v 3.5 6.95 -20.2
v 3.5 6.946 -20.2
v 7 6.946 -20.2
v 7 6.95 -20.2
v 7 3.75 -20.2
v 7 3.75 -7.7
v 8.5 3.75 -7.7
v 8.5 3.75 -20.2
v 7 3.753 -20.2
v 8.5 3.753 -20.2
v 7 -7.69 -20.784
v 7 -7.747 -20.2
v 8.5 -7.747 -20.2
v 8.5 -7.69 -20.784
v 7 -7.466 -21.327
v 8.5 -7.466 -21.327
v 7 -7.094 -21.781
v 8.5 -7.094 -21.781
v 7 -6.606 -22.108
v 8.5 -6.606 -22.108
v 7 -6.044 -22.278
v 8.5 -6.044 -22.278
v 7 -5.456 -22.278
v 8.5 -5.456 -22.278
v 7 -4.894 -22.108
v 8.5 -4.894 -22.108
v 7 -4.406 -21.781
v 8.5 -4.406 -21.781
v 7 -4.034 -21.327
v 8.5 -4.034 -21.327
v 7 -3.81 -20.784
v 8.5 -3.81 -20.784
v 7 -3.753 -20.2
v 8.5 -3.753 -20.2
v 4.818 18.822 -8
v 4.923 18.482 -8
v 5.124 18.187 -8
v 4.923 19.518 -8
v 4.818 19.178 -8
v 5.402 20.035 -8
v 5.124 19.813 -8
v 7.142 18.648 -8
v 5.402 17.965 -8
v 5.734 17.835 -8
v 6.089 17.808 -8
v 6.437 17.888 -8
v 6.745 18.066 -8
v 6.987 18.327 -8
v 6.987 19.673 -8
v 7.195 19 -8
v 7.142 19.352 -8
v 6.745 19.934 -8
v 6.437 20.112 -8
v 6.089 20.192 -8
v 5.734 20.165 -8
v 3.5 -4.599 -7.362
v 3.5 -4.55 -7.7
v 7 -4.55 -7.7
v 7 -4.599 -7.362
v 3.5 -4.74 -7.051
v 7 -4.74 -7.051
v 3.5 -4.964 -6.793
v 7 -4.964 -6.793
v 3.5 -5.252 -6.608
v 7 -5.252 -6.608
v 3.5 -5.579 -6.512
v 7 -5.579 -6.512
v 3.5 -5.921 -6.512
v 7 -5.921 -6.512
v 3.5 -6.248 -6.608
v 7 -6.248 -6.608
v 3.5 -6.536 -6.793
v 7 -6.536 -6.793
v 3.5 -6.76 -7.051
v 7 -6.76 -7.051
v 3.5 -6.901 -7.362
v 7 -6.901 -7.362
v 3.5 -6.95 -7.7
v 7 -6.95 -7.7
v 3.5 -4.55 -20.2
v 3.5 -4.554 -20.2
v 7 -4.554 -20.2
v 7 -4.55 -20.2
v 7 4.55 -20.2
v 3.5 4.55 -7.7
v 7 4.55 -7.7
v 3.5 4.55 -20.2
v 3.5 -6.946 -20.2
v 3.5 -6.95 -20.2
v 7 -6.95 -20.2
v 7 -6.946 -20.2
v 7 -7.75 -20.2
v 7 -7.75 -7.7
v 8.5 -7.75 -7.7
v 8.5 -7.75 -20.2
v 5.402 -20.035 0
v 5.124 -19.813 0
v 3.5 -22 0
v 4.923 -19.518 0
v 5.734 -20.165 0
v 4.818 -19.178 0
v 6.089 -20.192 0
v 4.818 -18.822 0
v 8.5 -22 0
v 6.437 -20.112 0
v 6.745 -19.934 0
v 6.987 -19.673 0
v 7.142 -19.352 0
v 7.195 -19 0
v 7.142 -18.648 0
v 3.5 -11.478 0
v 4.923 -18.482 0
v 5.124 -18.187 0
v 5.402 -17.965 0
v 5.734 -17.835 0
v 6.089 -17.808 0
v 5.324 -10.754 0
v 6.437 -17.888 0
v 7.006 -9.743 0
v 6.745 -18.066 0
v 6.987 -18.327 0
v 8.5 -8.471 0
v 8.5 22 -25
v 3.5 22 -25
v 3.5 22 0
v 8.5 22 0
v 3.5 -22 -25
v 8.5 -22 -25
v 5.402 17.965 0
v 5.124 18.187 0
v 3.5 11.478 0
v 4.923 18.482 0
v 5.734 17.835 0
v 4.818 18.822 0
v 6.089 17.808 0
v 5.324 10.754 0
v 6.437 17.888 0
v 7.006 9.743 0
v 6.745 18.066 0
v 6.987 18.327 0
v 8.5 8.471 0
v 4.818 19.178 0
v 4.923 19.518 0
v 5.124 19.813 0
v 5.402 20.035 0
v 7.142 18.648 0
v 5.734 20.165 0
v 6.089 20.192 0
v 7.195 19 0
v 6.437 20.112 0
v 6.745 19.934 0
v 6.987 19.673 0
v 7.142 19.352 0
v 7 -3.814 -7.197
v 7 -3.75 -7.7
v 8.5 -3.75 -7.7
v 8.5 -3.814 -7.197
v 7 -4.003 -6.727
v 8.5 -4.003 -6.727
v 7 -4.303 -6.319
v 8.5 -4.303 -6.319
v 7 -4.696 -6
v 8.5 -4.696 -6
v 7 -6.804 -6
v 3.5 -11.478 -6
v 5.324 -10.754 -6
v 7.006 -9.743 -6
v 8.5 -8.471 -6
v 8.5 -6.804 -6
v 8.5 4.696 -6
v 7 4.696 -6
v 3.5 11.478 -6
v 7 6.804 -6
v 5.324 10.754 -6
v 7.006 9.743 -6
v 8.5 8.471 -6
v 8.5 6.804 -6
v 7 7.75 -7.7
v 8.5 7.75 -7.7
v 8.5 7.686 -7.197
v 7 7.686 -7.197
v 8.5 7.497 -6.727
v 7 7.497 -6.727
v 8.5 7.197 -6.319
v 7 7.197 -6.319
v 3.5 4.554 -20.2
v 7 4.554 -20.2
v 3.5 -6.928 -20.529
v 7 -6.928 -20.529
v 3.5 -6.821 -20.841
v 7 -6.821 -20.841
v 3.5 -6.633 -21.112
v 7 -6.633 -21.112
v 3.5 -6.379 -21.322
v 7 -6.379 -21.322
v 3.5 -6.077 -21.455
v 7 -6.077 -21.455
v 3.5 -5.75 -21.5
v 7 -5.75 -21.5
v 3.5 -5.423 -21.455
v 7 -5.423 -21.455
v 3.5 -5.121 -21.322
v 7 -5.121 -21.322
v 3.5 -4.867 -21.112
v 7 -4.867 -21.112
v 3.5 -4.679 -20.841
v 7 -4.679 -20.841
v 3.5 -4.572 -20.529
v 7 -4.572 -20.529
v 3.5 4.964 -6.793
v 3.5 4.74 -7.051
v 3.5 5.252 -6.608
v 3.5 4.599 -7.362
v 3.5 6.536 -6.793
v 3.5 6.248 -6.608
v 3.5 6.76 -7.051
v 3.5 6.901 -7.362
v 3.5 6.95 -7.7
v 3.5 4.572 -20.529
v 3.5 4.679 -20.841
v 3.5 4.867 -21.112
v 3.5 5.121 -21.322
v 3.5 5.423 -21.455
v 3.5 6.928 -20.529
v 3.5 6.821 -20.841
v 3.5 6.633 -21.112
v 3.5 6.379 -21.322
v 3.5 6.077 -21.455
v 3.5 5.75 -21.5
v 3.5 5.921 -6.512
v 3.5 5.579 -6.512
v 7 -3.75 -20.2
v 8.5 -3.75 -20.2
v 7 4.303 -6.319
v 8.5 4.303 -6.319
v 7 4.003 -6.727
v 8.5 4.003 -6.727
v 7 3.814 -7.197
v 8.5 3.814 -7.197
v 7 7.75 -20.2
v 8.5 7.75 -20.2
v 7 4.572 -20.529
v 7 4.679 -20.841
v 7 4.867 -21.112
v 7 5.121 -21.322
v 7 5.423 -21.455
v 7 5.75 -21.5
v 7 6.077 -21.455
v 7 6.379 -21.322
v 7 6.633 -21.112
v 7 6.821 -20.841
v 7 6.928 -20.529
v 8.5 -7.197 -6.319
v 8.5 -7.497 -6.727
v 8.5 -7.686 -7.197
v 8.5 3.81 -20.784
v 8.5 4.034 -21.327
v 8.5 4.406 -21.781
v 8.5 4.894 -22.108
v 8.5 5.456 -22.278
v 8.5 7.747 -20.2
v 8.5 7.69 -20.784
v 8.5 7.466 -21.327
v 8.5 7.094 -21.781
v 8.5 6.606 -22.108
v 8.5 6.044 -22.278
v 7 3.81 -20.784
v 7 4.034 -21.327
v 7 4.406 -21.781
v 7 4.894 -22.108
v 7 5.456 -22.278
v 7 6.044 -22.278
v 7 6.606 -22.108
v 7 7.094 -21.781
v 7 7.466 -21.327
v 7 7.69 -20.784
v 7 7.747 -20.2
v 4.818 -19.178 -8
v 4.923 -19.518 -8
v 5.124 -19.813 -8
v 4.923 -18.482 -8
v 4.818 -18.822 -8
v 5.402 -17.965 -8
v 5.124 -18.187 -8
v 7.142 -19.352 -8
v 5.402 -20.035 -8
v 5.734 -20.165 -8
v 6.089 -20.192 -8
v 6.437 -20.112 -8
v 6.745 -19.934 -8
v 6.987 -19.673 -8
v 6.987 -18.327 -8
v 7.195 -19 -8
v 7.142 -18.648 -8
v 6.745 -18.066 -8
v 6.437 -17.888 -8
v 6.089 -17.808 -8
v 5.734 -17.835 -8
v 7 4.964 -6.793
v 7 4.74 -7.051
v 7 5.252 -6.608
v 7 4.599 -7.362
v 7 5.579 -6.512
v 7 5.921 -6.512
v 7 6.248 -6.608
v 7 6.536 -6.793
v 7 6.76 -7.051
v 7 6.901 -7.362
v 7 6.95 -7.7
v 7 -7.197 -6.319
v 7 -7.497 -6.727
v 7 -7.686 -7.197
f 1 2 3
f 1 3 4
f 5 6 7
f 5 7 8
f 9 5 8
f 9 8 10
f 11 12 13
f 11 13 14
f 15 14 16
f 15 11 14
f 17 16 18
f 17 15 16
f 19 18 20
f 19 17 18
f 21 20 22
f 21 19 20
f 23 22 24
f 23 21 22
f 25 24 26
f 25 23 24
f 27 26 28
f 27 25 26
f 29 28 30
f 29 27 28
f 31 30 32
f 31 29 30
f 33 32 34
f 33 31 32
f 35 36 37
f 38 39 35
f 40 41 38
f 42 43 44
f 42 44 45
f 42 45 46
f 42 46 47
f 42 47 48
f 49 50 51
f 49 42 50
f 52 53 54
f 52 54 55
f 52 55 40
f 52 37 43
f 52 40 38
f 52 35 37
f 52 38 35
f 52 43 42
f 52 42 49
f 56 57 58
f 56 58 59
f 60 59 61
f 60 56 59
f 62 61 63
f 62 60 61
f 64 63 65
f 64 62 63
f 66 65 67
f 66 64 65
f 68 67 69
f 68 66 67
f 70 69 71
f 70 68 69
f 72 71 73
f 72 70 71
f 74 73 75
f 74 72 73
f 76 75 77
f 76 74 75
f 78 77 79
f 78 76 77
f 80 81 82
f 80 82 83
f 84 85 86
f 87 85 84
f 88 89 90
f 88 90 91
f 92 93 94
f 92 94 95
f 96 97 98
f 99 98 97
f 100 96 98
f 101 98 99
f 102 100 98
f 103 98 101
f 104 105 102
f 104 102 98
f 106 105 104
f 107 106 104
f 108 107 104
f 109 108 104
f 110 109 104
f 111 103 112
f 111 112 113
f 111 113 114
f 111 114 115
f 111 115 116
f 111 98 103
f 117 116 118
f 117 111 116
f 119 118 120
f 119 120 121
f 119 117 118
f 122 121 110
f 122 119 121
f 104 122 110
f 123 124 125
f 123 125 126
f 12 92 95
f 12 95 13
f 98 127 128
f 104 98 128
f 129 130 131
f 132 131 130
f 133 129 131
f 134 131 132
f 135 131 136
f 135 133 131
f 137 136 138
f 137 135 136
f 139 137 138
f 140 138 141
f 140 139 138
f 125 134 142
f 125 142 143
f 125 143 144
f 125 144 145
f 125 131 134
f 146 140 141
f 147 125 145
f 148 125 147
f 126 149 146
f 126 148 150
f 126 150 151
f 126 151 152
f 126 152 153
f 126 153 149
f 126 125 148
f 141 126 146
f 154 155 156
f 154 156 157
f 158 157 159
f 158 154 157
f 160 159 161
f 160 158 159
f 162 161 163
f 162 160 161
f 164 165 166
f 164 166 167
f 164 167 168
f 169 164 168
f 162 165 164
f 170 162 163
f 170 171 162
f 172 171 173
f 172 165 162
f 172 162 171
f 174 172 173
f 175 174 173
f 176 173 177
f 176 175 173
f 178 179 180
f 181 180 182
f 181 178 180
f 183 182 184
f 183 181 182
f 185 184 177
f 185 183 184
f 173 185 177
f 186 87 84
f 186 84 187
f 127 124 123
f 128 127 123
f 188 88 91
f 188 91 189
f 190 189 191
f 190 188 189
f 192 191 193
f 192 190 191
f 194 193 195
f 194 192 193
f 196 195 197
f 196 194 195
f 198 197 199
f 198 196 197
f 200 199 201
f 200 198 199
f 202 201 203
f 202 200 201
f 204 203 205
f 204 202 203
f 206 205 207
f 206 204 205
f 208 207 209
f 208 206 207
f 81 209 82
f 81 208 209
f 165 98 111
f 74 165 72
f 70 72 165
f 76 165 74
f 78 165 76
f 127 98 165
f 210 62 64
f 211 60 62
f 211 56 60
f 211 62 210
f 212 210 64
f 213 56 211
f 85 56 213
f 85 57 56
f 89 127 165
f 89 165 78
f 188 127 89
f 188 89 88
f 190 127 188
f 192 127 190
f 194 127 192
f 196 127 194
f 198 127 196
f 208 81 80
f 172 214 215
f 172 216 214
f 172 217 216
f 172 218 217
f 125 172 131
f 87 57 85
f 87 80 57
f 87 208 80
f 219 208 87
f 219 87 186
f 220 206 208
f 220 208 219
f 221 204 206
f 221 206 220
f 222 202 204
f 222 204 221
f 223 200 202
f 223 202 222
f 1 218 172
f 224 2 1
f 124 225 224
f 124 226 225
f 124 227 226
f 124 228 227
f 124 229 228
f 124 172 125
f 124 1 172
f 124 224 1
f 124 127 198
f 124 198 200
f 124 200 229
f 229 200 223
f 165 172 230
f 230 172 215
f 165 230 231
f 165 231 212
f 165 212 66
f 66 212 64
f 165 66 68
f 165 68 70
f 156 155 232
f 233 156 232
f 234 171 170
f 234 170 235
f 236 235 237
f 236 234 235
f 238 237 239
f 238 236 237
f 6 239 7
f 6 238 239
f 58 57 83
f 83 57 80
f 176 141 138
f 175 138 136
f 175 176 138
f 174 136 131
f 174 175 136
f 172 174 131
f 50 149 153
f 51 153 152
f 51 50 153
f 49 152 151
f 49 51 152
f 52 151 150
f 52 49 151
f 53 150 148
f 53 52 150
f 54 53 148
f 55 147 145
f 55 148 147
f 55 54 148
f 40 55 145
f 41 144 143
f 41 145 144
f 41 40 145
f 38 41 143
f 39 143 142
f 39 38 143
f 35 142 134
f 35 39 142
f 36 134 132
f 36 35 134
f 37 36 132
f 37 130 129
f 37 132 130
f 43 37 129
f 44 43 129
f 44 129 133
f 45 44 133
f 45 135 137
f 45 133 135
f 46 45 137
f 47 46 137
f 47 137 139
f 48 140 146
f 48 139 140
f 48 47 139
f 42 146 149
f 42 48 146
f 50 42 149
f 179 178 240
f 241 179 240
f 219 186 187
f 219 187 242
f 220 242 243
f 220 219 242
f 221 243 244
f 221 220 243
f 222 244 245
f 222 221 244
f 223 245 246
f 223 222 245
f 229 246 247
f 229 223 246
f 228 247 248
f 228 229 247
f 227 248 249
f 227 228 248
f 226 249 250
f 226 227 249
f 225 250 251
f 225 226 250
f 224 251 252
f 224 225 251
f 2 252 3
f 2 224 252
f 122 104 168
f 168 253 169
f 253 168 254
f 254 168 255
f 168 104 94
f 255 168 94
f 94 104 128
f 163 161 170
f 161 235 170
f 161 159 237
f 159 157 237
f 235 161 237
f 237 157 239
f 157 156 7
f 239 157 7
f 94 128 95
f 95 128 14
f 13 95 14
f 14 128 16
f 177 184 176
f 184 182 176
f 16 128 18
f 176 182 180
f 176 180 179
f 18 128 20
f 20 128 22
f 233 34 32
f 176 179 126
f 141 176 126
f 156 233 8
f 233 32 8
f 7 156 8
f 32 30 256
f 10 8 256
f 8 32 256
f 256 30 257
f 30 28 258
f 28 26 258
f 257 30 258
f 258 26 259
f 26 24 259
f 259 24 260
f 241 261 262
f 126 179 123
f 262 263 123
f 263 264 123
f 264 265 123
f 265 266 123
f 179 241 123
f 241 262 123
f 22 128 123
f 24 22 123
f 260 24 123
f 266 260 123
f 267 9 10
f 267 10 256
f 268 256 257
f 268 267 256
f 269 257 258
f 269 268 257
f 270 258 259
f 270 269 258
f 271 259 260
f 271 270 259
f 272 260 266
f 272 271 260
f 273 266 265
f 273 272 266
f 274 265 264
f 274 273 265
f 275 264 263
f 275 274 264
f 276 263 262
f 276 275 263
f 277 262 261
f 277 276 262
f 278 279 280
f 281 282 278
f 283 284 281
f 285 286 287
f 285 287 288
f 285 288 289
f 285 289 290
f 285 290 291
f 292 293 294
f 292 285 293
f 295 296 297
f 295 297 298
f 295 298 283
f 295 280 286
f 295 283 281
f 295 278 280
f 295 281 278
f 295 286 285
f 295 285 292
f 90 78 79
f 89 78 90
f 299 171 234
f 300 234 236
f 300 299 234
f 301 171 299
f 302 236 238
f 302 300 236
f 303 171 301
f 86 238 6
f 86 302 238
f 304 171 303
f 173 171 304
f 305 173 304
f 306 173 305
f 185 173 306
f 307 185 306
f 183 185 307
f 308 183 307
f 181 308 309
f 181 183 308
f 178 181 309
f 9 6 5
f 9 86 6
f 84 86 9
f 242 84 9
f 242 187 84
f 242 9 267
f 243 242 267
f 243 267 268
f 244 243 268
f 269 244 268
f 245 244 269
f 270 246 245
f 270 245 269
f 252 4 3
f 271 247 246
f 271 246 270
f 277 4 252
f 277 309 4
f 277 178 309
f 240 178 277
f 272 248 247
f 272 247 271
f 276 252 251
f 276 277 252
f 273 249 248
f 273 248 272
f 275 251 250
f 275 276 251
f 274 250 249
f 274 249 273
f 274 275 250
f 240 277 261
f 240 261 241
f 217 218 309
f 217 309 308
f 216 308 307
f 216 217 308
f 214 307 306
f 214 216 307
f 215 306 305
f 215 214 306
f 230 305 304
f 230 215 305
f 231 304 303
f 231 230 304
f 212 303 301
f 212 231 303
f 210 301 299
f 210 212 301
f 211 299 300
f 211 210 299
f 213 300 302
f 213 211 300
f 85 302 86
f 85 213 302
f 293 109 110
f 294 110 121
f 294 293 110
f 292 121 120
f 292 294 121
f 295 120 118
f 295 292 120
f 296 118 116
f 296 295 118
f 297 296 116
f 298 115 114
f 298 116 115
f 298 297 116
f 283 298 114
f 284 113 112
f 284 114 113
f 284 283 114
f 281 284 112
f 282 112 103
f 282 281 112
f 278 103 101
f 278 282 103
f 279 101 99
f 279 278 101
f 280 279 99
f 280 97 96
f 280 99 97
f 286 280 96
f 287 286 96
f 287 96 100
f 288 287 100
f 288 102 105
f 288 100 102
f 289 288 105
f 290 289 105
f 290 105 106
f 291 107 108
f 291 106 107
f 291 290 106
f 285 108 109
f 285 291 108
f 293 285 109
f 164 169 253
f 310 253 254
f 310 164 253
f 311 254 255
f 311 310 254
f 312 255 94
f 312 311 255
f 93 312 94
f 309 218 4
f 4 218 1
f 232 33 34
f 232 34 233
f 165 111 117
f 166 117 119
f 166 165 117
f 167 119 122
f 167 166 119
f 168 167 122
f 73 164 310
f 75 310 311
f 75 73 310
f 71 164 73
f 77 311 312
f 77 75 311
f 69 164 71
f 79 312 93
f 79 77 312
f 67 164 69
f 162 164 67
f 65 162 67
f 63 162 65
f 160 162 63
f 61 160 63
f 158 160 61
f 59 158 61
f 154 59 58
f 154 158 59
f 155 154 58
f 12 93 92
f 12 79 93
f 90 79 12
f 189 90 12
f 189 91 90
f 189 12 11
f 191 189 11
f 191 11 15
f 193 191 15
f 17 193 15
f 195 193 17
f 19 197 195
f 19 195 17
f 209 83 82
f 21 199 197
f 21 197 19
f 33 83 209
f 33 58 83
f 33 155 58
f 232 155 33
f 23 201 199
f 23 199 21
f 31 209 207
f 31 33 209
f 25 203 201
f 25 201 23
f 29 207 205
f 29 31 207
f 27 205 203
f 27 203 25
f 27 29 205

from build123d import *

# Parameters (mm, degrees)
CYLINDER014_R             = 2
CYLINDER014_DEPTH         = 1.6
CYLINDER015_R             = 2
CYLINDER015_DEPTH         = 1.6
BOX003_W                  = 12.5
BOX003_H                  = 4
BOX003_DEPTH              = 1.6
FUSION006_PLACEMENT_ANGLE = 90
CYLINDER016_R             = 2
CYLINDER016_DEPTH         = 1.6
CYLINDER017_R             = 2
CYLINDER017_DEPTH         = 1.6
BOX004_W                  = 12.5
BOX004_H                  = 4
BOX004_DEPTH              = 1.6
FUSION007_PLACEMENT_ANGLE = 90
CYLINDER007_R             = 1.195
CYLINDER007_DEPTH         = 10
CYLINDER006_R             = 1.195
CYLINDER006_DEPTH         = 10
CYLINDER005_R             = 12
CYLINDER005_DEPTH         = 17
CYLINDER001_R             = 1.2
CYLINDER001_DEPTH         = 10
CYLINDER002_R             = 1.2
CYLINDER002_DEPTH         = 10
BOX001_W                  = 12.5
BOX001_H                  = 2.4
BOX001_DEPTH              = 10
FUSION_PLACEMENT_ANGLE    = 90
CYLINDER003_R             = 1.2
CYLINDER003_DEPTH         = 10
CYLINDER004_R             = 1.2
CYLINDER004_DEPTH         = 10
BOX002_W                  = 12.5
BOX002_H                  = 2.4
BOX002_DEPTH              = 10
FUSION001_PLACEMENT_ANGLE = 90
BOX_W                     = 5
BOX_H                     = 44
BOX_DEPTH                 = 25


with BuildPart() as cylinder014:
    # Cylinder014 → Cylinder014 (new body)
    with BuildSketch(Plane.XY):
        Circle(CYLINDER014_R)
    extrude(amount=CYLINDER014_DEPTH)


with BuildPart() as cylinder015:
    # Cylinder015 → Cylinder015 (new body)
    with BuildSketch(Plane(origin=(12.6, 0, 0), x_dir=(1, 0, 0), z_dir=(0, 0, 1))):
        Circle(CYLINDER015_R)
    extrude(amount=CYLINDER015_DEPTH)


with BuildPart() as langloch002:
    # Box003 → Box003 (new body)
    with BuildSketch(Plane(origin=(0, -2, 0), x_dir=(1, 0, 0), z_dir=(0, 0, 1))):
        with Locations((6.25, 2)):
            Rectangle(BOX003_W, BOX003_H)
    extrude(amount=BOX003_DEPTH)

    # Fusion006: union Cylinder014, Cylinder015
    add(cylinder014.part)
    add(cylinder015.part)


with BuildPart() as langloch002_1:
    # Fusion006 placement: moved
    add(langloch002.part.moved(Location((7, -5.75, -7.7))).rotate(Axis((7, -5.75, -7.7), (0, 1, 0)), FUSION006_PLACEMENT_ANGLE))


with BuildPart() as cylinder016:
    # Cylinder016 → Cylinder016 (new body)
    with BuildSketch(Plane.XY):
        Circle(CYLINDER016_R)
    extrude(amount=CYLINDER016_DEPTH)


with BuildPart() as cylinder017:
    # Cylinder017 → Cylinder017 (new body)
    with BuildSketch(Plane(origin=(12.6, 0, 0), x_dir=(1, 0, 0), z_dir=(0, 0, 1))):
        Circle(CYLINDER017_R)
    extrude(amount=CYLINDER017_DEPTH)


with BuildPart() as fusion008:
    # Box004 → Box004 (new body)
    with BuildSketch(Plane(origin=(0, -2, 0), x_dir=(1, 0, 0), z_dir=(0, 0, 1))):
        with Locations((6.25, 2)):
            Rectangle(BOX004_W, BOX004_H)
    extrude(amount=BOX004_DEPTH)

    # Fusion007: union Cylinder016, Cylinder017
    add(cylinder016.part)
    add(cylinder017.part)


with BuildPart() as fusion008_1:
    # Fusion007 placement: moved
    add(fusion008.part.moved(Location((7, 5.75, -7.7))).rotate(Axis((7, 5.75, -7.7), (0, 1, 0)), FUSION007_PLACEMENT_ANGLE))

    # Fusion008: union Langloch002
    add(langloch002_1.part)


with BuildPart() as cylinder007:
    # Cylinder007 → Cylinder007 (new body)
    with BuildSketch(Plane(origin=(6, -19, -8), x_dir=(1, 0, 0), z_dir=(0, 0, 1))):
        Circle(CYLINDER007_R)
    extrude(amount=CYLINDER007_DEPTH)


with BuildPart() as fusion003:
    # Cylinder006 → Cylinder006 (new body)
    with BuildSketch(Plane(origin=(6, 19, -8), x_dir=(1, 0, 0), z_dir=(0, 0, 1))):
        Circle(CYLINDER006_R)
    extrude(amount=CYLINDER006_DEPTH)

    # Fusion003: union Cylinder007
    add(cylinder007.part)


with BuildPart() as cylinder005:
    # Cylinder005 → Cylinder005 (new body)
    with BuildSketch(Plane.XY.offset(-6)):
        Circle(CYLINDER005_R)
    extrude(amount=CYLINDER005_DEPTH)


with BuildPart() as cylinder001:
    # Cylinder001 → Cylinder001 (new body)
    with BuildSketch(Plane.XY):
        Circle(CYLINDER001_R)
    extrude(amount=CYLINDER001_DEPTH)


with BuildPart() as cylinder002:
    # Cylinder002 → Cylinder002 (new body)
    with BuildSketch(Plane(origin=(12.6, 0, 0), x_dir=(1, 0, 0), z_dir=(0, 0, 1))):
        Circle(CYLINDER002_R)
    extrude(amount=CYLINDER002_DEPTH)


with BuildPart() as langloch:
    # Box001 → Box001 (new body)
    with BuildSketch(Plane(origin=(0, -1.2, 0), x_dir=(1, 0, 0), z_dir=(0, 0, 1))):
        with Locations((6.25, 1.2)):
            Rectangle(BOX001_W, BOX001_H)
    extrude(amount=BOX001_DEPTH)

    # Fusion: union Cylinder001, Cylinder002
    add(cylinder001.part)
    add(cylinder002.part)


with BuildPart() as langloch_1:
    # Fusion placement: moved
    add(langloch.part.moved(Location((0, 5.75, -7.7))).rotate(Axis((0, 5.75, -7.7), (0, 1, 0)), FUSION_PLACEMENT_ANGLE))


with BuildPart() as cylinder003:
    # Cylinder003 → Cylinder003 (new body)
    with BuildSketch(Plane.XY):
        Circle(CYLINDER003_R)
    extrude(amount=CYLINDER003_DEPTH)


with BuildPart() as cylinder004:
    # Cylinder004 → Cylinder004 (new body)
    with BuildSketch(Plane(origin=(12.6, 0, 0), x_dir=(1, 0, 0), z_dir=(0, 0, 1))):
        Circle(CYLINDER004_R)
    extrude(amount=CYLINDER004_DEPTH)


with BuildPart() as fusion002:
    # Box002 → Box002 (new body)
    with BuildSketch(Plane(origin=(0, -1.2, 0), x_dir=(1, 0, 0), z_dir=(0, 0, 1))):
        with Locations((6.25, 1.2)):
            Rectangle(BOX002_W, BOX002_H)
    extrude(amount=BOX002_DEPTH)

    # Fusion001: union Cylinder003, Cylinder004
    add(cylinder003.part)
    add(cylinder004.part)


with BuildPart() as fusion002_1:
    # Fusion001 placement: moved
    add(fusion002.part.moved(Location((0, -5.75, -7.7))).rotate(Axis((0, -5.75, -7.7), (0, 1, 0)), FUSION001_PLACEMENT_ANGLE))

    # Fusion002: union Langloch
    add(langloch_1.part)


with BuildPart() as kickeraligner:
    # Box → Box (new body)
    with BuildSketch(Plane(origin=(3.5, -22, -25), x_dir=(1, 0, 0), z_dir=(0, 0, 1))):
        with Locations((2.5, 22)):
            Rectangle(BOX_W, BOX_H)
    extrude(amount=BOX_DEPTH)

    # Cut001: cut Fusion002
    add(fusion002_1.part, mode=Mode.SUBTRACT)

    # Cut002: cut Cylinder005
    add(cylinder005.part, mode=Mode.SUBTRACT)

    # Cut003: cut Fusion003
    add(fusion003.part, mode=Mode.SUBTRACT)

    # Cut006: cut Fusion008
    add(fusion008_1.part, mode=Mode.SUBTRACT)


solid = kickeraligner.part
